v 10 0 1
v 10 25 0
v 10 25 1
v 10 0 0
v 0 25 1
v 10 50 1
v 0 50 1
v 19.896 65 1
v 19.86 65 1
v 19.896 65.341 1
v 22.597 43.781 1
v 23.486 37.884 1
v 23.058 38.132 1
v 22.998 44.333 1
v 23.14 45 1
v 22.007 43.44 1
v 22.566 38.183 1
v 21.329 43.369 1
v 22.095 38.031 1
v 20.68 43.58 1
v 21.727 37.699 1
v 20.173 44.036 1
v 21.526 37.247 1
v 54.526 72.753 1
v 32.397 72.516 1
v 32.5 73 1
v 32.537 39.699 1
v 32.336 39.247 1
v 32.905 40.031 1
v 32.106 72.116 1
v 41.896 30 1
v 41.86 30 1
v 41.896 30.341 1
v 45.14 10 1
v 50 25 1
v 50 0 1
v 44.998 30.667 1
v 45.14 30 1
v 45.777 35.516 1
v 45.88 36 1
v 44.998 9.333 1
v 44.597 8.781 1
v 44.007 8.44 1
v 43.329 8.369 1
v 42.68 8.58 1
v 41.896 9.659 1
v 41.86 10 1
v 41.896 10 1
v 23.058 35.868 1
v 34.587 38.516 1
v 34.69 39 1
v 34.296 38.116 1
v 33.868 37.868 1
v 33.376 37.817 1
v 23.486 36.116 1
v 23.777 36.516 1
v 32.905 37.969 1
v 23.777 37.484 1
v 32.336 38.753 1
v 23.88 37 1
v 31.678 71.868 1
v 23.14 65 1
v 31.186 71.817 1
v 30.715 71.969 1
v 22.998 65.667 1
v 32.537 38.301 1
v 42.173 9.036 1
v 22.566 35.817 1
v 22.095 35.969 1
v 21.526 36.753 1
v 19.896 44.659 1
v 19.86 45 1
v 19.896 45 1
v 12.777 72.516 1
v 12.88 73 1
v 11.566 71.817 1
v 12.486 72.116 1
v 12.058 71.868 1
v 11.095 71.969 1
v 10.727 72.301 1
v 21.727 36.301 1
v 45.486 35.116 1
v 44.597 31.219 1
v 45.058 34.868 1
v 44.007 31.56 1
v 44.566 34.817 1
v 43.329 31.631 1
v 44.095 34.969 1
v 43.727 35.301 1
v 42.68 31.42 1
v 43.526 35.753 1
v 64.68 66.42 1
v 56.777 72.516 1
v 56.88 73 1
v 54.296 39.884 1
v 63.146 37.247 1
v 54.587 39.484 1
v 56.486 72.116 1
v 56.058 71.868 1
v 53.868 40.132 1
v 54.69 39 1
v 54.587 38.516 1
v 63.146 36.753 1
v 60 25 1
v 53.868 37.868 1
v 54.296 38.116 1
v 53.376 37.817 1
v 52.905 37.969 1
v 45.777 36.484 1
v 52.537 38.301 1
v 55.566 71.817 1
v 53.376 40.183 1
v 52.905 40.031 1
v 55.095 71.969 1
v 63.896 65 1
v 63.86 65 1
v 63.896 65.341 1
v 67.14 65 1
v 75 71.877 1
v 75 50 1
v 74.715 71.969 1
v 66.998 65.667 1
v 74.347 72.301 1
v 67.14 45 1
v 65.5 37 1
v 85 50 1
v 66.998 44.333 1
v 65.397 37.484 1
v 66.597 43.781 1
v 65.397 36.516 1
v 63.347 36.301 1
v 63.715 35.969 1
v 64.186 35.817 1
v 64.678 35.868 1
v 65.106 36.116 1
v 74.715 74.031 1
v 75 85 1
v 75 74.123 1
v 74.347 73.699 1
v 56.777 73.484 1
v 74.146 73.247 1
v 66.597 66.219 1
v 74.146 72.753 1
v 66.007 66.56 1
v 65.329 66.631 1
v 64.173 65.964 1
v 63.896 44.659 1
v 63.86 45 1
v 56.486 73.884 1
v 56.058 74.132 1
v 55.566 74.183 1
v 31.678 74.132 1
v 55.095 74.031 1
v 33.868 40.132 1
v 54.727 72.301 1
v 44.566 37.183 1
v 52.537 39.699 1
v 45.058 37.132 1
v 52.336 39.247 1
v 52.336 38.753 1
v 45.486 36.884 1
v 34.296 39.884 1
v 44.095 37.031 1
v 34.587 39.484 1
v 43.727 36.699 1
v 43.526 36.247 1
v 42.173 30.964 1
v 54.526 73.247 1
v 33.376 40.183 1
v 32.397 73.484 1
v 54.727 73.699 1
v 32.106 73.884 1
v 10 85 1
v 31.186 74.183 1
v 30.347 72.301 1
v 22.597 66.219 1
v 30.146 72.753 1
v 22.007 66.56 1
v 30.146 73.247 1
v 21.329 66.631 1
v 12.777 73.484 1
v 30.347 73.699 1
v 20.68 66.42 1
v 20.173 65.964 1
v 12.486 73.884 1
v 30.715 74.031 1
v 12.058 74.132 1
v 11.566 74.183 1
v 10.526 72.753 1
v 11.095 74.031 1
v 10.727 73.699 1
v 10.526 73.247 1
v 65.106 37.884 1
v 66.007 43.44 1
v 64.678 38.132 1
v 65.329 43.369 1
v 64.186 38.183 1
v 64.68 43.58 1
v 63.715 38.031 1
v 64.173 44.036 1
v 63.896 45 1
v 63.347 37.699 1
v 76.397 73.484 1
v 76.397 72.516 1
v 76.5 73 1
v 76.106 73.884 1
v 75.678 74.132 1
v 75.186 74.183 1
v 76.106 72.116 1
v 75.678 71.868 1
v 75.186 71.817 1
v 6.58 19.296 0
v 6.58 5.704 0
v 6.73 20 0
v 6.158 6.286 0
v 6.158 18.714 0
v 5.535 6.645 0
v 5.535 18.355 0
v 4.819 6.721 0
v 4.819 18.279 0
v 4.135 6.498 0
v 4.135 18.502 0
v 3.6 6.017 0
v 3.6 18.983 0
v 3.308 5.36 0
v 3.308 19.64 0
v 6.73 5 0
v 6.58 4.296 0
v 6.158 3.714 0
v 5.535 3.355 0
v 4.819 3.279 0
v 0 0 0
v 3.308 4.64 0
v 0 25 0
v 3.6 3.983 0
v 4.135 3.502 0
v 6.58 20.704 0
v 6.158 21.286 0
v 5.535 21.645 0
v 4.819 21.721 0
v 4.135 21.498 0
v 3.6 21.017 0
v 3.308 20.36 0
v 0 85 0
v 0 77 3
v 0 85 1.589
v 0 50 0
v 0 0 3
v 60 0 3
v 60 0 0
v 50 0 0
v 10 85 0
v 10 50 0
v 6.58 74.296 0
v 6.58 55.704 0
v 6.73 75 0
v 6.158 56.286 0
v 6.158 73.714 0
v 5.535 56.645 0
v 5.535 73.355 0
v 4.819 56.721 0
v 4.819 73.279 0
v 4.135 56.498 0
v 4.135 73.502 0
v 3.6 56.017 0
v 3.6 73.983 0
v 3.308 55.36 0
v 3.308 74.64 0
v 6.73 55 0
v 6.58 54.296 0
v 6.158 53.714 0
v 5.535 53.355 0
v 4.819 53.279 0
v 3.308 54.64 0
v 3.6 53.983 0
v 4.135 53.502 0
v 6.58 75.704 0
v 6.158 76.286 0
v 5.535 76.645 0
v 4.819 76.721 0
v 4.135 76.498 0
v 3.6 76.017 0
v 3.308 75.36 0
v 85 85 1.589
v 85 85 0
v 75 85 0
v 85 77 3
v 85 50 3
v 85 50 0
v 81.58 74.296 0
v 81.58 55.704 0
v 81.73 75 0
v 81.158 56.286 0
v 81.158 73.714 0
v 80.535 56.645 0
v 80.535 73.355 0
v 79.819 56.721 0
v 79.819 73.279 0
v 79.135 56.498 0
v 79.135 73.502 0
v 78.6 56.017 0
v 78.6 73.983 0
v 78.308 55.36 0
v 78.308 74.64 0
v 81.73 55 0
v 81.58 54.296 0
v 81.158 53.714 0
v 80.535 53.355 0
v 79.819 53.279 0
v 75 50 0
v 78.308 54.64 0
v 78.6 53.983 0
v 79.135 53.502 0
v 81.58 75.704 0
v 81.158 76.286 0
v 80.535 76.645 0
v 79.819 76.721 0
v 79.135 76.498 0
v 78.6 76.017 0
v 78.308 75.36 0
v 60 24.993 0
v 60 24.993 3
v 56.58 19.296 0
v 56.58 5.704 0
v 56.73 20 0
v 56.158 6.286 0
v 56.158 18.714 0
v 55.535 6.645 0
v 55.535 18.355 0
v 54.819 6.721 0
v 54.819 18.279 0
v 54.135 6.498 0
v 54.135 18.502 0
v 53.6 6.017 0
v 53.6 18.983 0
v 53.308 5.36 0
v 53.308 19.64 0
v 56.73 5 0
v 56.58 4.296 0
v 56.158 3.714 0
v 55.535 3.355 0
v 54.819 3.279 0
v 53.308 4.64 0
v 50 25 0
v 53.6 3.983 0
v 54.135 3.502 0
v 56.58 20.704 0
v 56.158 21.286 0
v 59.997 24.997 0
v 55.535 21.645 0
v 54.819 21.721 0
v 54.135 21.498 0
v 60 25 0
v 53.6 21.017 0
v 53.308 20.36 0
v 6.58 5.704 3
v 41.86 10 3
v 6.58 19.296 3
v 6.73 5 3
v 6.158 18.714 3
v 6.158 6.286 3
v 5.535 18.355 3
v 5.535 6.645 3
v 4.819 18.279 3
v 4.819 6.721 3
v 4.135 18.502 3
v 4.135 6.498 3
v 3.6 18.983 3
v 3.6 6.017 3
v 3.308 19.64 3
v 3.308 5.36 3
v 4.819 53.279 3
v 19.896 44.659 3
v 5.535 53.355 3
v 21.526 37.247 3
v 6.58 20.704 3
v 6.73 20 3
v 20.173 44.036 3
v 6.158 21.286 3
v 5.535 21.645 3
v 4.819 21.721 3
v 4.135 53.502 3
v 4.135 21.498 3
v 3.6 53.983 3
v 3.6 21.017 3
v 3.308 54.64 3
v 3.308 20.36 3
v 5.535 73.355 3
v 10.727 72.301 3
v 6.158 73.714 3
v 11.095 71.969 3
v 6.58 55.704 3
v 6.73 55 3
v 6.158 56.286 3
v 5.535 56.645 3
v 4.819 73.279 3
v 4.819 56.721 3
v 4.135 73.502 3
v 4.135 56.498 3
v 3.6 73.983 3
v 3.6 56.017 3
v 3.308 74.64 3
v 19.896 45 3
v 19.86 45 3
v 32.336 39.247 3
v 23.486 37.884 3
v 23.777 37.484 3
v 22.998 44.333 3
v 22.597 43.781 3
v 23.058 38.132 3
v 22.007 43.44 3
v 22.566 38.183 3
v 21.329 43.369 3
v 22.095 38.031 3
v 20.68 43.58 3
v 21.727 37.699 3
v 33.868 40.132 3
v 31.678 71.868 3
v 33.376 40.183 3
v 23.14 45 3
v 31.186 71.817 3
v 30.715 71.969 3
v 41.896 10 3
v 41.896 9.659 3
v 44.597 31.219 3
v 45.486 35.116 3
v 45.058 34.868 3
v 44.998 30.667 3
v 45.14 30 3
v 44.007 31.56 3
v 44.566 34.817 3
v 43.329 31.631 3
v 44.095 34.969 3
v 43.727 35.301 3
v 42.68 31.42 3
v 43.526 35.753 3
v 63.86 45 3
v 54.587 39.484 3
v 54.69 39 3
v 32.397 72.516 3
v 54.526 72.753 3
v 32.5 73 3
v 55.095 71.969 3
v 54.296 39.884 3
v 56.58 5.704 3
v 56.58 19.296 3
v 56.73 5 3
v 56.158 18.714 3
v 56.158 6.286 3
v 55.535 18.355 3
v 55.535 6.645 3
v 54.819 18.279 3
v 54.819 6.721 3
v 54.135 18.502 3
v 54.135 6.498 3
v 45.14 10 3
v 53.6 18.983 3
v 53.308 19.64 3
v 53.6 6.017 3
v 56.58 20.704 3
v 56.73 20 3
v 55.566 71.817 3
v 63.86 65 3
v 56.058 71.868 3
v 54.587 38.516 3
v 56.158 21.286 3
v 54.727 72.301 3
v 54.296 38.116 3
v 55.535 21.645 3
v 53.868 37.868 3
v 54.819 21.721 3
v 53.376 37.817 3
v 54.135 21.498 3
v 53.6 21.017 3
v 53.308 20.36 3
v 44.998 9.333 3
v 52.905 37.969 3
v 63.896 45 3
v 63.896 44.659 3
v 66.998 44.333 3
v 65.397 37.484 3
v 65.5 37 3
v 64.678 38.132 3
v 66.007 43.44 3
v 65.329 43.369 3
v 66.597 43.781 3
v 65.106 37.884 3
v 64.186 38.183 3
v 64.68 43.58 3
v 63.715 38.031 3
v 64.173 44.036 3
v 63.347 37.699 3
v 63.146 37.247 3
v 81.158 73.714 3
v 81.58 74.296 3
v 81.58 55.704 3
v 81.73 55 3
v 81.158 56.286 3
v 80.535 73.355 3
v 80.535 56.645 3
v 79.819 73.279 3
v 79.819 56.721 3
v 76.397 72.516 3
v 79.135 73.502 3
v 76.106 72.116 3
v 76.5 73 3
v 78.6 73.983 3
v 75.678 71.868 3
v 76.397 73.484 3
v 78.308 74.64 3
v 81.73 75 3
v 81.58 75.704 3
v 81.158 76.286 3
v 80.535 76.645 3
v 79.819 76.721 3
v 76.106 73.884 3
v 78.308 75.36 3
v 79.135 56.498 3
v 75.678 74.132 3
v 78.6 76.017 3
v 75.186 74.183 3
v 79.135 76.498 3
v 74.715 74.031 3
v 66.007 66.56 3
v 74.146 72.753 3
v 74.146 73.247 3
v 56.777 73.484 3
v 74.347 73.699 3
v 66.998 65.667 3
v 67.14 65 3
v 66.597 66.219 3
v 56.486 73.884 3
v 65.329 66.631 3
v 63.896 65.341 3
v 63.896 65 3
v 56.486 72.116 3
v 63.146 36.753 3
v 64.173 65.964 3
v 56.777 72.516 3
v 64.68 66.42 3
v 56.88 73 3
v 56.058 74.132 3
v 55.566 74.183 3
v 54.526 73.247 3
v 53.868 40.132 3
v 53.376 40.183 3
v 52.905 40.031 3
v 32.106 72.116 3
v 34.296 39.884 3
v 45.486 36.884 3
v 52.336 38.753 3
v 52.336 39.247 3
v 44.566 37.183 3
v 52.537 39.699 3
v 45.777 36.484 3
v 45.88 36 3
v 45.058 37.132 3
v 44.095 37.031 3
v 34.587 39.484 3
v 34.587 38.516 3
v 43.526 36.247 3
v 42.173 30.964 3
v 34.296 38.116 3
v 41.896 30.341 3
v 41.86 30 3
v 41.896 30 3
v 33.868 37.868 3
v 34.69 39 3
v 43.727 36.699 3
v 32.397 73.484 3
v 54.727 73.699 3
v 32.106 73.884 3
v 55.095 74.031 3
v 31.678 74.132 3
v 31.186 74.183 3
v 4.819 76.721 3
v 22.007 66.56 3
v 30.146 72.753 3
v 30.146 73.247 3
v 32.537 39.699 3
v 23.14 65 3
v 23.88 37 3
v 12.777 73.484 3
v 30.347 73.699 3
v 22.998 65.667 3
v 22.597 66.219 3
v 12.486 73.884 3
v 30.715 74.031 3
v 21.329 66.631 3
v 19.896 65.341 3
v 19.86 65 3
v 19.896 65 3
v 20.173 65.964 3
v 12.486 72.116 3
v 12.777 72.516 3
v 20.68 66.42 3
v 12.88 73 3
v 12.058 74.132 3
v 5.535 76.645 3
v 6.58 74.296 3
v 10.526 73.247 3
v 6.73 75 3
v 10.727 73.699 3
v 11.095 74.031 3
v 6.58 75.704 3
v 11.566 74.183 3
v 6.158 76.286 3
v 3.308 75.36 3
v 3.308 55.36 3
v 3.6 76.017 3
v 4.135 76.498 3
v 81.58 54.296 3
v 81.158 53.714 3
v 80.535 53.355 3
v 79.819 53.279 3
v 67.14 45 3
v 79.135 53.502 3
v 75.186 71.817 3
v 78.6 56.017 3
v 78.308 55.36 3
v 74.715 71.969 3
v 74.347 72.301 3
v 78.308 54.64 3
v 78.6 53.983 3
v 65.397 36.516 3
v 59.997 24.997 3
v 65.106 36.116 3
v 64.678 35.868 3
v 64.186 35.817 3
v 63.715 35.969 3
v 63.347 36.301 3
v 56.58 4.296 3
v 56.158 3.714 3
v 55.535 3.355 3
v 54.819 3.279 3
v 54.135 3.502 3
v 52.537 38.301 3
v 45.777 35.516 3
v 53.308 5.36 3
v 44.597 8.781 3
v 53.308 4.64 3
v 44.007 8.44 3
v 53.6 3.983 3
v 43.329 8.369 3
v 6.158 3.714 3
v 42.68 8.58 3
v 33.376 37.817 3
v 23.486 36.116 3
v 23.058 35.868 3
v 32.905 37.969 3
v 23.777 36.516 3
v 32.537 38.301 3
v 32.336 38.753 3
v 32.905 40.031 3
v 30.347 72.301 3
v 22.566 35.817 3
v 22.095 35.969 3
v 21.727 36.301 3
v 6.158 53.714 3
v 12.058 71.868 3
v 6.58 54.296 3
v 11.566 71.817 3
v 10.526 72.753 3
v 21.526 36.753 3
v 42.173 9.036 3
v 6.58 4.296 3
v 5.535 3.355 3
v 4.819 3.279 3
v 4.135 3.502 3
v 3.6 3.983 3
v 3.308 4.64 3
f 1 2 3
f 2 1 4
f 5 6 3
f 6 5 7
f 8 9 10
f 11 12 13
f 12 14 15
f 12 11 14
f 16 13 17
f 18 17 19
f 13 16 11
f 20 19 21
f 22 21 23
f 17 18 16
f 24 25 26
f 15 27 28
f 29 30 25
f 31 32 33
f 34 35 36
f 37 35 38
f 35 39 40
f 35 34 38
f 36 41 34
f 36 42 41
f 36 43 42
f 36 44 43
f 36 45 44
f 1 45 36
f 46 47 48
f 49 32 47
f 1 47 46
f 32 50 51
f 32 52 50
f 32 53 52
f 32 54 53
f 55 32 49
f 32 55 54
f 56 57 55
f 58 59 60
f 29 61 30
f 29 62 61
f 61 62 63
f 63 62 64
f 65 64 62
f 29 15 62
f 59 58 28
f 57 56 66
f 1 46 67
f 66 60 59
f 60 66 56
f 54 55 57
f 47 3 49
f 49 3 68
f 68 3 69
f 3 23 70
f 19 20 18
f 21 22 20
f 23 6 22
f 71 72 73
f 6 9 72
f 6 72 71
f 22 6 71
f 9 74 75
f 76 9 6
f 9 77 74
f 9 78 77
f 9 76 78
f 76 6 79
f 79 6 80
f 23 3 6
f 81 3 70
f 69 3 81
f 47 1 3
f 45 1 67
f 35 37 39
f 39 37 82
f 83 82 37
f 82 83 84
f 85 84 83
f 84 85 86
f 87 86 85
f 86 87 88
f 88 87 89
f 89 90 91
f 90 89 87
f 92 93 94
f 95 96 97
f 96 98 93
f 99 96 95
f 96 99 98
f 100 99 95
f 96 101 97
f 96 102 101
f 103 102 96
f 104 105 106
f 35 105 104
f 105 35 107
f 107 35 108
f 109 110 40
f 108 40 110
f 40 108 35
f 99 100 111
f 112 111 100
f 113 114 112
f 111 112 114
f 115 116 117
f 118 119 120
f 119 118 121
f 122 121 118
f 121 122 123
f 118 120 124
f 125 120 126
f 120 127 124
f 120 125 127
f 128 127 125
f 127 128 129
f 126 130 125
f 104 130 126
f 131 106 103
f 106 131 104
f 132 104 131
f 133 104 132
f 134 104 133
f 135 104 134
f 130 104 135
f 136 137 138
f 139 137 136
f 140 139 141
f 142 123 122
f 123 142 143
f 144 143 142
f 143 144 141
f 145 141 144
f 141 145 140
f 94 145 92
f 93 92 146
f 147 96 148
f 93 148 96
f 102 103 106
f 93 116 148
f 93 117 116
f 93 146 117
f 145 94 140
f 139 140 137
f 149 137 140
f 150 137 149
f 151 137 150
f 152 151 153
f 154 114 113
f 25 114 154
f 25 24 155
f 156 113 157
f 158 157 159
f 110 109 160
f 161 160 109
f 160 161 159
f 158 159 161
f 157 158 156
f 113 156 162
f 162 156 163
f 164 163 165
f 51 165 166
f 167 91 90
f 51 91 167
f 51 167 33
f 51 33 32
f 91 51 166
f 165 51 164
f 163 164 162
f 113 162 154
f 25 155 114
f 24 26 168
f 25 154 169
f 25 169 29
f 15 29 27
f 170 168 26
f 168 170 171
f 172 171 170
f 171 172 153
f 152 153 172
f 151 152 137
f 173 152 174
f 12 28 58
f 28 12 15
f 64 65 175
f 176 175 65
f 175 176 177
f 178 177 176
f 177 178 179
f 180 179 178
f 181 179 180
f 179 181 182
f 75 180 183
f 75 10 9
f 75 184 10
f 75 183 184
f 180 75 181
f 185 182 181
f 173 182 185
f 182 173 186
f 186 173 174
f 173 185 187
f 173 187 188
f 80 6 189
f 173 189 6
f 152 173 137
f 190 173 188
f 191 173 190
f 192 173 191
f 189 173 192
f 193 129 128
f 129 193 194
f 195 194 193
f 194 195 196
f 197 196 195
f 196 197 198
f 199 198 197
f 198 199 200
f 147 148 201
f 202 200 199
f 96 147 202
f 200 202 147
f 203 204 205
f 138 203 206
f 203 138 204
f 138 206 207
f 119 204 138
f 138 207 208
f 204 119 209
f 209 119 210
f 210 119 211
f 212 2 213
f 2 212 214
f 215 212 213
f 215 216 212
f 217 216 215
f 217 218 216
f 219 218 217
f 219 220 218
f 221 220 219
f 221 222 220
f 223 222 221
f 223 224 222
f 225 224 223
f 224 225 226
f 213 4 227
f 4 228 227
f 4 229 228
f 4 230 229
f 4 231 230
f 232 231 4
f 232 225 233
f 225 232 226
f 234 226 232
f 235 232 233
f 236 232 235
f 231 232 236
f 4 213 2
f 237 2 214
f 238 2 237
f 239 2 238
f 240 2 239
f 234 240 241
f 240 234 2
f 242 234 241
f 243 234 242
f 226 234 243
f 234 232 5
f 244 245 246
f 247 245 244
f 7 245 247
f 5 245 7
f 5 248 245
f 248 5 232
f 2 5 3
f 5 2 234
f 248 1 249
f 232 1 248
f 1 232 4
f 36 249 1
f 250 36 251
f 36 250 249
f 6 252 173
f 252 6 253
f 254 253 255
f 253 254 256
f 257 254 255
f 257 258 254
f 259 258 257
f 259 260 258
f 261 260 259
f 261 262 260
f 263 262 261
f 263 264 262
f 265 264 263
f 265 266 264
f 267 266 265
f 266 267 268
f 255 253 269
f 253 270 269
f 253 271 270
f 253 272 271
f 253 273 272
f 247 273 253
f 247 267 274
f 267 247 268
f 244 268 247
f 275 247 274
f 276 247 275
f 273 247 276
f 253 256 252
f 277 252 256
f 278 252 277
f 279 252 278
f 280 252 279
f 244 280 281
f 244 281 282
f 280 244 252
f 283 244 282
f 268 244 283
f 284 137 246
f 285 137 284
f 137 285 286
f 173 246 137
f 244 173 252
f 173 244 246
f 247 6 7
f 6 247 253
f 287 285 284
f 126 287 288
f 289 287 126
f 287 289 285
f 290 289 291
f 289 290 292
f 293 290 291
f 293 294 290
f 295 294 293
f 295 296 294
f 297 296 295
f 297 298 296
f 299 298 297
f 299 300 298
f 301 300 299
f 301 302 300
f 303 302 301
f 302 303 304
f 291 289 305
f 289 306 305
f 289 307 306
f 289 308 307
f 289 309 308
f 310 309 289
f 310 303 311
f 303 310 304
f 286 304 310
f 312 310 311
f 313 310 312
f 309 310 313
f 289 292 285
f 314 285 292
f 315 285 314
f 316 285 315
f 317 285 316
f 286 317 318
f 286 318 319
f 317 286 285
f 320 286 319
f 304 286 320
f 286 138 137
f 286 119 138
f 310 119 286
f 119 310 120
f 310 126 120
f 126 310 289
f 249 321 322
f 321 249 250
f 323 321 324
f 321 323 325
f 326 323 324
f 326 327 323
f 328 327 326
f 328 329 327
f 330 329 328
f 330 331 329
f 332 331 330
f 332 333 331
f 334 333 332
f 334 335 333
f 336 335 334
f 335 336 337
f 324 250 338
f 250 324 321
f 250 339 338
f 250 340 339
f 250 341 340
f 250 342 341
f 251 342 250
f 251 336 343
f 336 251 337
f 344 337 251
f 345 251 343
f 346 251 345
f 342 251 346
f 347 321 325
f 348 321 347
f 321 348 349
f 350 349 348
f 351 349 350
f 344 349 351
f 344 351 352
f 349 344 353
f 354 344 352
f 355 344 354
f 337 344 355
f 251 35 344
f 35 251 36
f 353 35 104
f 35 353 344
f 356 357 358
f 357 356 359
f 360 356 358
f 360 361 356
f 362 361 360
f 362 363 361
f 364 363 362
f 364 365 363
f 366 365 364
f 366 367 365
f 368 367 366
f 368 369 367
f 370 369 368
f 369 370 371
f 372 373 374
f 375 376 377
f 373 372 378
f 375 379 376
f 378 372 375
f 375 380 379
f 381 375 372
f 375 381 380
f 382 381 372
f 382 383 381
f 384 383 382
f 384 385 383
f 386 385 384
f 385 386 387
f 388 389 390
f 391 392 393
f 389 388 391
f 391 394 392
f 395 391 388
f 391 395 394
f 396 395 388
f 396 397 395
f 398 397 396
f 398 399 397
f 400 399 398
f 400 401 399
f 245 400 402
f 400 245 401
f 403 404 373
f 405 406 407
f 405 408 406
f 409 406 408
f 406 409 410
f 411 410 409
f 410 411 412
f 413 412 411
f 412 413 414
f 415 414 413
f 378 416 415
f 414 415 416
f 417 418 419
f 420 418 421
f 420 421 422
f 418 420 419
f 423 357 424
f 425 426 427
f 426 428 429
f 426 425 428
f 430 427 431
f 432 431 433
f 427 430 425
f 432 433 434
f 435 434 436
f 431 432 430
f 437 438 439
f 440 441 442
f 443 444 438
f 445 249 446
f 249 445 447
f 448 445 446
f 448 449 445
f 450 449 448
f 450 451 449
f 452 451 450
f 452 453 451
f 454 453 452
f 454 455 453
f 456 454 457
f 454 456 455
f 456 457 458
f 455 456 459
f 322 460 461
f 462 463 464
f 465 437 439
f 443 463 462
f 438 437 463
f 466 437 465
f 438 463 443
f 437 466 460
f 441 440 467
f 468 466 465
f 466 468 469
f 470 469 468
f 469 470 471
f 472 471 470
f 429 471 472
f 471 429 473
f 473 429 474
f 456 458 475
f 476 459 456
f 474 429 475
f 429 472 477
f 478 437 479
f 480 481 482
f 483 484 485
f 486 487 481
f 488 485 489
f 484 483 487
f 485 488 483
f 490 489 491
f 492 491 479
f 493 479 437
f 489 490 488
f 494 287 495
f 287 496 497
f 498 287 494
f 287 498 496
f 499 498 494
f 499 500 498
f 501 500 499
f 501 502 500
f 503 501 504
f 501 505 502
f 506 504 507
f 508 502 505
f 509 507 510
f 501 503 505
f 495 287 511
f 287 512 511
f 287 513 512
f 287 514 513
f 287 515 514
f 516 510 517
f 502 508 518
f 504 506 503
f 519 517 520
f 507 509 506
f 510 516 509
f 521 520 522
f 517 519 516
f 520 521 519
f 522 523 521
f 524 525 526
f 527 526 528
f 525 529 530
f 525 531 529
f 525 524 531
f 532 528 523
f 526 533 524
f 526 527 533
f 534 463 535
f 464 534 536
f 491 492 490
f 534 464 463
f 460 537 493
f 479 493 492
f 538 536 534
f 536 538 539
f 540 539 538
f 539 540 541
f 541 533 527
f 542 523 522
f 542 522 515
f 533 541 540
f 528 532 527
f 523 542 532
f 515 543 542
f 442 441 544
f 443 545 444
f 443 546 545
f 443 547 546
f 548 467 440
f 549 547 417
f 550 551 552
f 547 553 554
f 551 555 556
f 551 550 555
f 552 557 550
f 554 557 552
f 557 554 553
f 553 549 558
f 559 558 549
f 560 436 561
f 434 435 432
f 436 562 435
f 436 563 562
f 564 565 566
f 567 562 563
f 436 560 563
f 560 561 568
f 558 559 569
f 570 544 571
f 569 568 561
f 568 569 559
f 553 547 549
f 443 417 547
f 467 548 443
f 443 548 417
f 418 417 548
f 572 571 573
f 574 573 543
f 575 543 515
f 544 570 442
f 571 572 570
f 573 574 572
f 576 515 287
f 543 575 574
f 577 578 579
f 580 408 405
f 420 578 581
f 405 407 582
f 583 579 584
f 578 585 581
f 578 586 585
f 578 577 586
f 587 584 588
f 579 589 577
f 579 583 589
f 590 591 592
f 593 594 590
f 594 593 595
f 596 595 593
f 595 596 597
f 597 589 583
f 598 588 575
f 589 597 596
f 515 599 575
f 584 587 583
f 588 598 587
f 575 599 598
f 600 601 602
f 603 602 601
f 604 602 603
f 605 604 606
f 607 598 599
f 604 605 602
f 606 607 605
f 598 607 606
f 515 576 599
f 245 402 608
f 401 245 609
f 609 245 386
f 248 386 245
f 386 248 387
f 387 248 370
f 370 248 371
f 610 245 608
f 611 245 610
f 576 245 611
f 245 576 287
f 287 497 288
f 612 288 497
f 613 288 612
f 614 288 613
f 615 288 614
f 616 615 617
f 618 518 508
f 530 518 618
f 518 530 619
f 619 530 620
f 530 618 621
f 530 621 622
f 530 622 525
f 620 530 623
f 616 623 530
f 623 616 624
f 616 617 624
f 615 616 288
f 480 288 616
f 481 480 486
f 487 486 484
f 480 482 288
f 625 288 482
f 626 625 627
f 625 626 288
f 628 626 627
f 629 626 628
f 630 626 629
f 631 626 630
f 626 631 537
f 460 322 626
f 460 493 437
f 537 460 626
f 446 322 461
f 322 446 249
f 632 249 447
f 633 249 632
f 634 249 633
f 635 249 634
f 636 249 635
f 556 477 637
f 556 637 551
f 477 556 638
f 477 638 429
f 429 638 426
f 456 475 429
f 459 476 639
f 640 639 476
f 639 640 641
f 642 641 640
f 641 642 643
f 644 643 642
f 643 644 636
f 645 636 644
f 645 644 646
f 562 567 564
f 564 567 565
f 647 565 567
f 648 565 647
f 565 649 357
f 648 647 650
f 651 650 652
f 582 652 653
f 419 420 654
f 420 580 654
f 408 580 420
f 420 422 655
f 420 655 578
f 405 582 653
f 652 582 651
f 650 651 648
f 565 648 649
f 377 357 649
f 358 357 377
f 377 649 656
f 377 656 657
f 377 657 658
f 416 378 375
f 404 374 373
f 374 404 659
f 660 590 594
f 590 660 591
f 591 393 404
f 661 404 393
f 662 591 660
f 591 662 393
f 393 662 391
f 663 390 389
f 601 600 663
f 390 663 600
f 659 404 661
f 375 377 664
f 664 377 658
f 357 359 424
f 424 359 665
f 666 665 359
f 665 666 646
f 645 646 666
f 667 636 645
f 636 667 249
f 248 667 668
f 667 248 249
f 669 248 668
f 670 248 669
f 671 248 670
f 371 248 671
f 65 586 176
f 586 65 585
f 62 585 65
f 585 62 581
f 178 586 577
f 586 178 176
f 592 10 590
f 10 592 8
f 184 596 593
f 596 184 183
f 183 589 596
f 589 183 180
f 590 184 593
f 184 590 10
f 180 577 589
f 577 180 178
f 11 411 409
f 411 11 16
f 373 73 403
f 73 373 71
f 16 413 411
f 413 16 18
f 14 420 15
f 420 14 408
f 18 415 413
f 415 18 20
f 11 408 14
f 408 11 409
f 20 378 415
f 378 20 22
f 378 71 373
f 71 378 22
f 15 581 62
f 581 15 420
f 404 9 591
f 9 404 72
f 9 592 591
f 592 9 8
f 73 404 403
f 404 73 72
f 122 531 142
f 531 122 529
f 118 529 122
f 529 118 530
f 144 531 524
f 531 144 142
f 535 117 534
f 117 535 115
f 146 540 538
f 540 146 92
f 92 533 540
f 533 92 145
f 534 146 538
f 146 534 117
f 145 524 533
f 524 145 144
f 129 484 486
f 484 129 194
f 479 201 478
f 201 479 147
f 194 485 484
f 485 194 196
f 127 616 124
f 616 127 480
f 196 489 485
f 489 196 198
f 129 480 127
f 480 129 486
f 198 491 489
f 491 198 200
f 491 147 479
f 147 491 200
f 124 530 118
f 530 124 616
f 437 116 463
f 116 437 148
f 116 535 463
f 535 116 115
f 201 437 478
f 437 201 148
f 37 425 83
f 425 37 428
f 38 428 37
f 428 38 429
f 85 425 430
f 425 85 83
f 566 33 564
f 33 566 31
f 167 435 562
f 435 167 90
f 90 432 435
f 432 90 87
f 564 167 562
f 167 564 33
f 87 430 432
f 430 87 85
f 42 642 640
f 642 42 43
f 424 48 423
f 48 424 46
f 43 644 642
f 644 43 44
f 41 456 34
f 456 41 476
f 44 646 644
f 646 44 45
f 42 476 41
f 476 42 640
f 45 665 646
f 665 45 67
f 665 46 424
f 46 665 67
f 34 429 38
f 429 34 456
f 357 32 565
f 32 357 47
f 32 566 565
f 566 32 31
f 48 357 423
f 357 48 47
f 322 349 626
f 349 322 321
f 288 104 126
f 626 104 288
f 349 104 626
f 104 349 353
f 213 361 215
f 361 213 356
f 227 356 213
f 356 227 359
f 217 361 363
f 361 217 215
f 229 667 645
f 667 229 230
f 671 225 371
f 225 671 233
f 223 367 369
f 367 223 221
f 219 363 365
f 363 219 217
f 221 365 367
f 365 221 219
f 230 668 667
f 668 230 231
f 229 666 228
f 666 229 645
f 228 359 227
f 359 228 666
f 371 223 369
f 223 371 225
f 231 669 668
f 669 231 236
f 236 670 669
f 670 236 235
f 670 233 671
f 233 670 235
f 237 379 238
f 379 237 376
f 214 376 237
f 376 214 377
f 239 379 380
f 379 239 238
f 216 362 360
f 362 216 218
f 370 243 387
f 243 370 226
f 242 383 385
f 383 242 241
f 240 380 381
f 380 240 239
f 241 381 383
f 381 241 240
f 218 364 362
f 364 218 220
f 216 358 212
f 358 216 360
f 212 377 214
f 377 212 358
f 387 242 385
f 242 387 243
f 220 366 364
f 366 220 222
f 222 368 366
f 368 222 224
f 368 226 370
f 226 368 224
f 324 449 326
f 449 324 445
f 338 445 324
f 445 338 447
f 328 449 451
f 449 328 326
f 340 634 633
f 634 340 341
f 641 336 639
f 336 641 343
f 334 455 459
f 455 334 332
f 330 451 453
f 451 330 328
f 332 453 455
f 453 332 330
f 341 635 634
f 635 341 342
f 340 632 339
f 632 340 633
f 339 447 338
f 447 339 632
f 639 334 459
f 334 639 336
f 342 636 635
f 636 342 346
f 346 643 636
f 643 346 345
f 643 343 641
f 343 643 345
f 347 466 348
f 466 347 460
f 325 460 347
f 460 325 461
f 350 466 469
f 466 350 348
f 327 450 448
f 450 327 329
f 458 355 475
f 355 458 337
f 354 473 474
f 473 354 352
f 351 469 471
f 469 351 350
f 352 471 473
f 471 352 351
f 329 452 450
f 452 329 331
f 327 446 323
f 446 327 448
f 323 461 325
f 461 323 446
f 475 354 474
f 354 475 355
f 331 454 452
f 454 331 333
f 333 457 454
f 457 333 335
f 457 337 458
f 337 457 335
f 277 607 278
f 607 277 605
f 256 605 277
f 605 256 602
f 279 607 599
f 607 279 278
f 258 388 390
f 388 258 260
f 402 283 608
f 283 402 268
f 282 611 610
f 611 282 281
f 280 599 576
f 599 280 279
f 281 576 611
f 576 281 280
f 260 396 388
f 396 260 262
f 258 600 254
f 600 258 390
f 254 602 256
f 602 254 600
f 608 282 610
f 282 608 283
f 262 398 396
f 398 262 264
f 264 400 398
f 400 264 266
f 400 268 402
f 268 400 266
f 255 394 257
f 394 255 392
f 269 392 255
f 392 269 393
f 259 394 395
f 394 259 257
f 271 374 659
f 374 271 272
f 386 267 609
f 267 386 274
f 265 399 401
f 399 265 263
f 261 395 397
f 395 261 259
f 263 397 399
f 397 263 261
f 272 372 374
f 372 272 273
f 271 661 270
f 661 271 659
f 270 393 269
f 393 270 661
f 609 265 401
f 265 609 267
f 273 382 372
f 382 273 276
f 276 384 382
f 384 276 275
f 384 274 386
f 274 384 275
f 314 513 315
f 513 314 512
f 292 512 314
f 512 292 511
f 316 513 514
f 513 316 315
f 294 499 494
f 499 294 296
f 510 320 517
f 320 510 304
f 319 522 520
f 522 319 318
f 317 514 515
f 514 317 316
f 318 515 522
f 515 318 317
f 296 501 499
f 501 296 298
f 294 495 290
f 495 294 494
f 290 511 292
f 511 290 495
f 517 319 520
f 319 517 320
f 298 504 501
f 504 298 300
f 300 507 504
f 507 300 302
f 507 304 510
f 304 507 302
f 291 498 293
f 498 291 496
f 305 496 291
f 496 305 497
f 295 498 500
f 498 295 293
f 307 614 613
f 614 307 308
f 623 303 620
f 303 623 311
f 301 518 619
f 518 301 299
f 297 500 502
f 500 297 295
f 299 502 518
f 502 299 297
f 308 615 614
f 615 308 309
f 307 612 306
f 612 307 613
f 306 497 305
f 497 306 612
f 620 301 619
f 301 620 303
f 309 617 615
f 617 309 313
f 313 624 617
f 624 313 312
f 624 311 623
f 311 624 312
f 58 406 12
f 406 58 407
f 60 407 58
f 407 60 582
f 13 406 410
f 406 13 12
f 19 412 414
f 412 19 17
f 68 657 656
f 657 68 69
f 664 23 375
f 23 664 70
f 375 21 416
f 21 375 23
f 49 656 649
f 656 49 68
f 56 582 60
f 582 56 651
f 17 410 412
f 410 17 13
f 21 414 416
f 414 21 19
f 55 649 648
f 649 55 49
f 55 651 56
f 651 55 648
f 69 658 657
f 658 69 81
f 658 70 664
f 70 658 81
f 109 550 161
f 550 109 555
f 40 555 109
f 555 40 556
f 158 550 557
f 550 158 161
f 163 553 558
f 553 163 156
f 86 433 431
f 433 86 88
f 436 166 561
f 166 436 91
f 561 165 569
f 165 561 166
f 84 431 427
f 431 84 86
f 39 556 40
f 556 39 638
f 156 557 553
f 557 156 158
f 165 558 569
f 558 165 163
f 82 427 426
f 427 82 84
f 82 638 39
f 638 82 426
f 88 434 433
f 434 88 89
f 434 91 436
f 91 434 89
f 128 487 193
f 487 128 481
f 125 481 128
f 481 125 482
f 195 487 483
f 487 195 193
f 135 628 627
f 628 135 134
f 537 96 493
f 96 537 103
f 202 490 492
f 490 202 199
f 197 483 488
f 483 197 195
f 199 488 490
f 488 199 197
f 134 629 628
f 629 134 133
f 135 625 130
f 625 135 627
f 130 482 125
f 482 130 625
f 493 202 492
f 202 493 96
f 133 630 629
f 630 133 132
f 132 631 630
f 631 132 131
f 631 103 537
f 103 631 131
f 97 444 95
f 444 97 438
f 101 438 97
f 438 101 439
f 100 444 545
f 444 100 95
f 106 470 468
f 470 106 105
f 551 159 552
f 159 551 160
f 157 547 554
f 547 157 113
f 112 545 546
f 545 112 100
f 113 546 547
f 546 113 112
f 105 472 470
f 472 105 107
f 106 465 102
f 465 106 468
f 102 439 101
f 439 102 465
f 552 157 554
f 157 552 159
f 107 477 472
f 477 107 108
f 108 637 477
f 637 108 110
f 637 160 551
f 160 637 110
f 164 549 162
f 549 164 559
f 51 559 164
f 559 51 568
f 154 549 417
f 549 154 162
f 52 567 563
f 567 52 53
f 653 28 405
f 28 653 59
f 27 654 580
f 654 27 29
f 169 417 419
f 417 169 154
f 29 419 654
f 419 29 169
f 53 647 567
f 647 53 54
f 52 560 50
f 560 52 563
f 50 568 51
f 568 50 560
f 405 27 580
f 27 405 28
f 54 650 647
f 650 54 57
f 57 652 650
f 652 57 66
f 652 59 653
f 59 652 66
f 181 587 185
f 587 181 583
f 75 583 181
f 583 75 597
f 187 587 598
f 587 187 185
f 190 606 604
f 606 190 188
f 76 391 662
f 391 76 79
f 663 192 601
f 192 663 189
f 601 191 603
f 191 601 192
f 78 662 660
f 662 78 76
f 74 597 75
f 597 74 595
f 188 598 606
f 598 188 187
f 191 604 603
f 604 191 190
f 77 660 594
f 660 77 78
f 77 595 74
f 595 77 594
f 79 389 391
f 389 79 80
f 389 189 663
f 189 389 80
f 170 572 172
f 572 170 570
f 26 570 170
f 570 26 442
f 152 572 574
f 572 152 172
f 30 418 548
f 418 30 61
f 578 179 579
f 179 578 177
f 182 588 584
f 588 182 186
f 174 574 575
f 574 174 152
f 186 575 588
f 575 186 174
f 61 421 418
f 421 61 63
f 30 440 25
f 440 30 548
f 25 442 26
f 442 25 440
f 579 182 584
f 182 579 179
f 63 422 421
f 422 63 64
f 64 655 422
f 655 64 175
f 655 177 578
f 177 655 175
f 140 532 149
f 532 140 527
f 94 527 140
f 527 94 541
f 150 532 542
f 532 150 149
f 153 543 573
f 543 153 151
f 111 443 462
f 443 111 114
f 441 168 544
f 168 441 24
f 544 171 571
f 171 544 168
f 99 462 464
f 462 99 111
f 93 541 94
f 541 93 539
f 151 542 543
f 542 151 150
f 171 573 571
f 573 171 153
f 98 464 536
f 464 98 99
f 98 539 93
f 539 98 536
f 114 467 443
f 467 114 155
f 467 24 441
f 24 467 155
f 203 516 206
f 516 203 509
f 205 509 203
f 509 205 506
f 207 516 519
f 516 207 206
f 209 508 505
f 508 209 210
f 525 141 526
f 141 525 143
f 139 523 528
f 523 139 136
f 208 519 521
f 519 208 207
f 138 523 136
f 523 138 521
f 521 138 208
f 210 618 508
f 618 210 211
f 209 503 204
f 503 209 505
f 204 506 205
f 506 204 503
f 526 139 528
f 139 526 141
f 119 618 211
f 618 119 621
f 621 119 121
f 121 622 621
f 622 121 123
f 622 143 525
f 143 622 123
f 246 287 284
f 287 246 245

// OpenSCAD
length=85;
wrist=60;
width=85;
res=15;
//length
difference(){
union(){
cube([10,25,1]); 
translate([0,length-35,0])cube([10,35,1]);
translate([wrist+25-10,length-35,0]) cube([10,35,1]);
translate([wrist-10,0,0]) cube([10,25,1]);   
translate([0,0,1])cube([wrist+25,length,2]);
}
union(){
//palm cutout
translate([85,50,0]) rotate([0,0,45+180]) cube([35.36,50,6]);
translate([wrist,0,0]) cube([length-wrist,25,6]);
//holes   
translate([5,5,0]) cylinder(10,r=3.46/2,true,$fn=res);
translate([5,20,0]) cylinder(10,r=3.46/2,true,$fn=res);   
translate([wrist-5,5,0]) cylinder(10,r=3.46/2,true,$fn=res);
translate([wrist-5,20,0]) cylinder(10,r=3.46/2,true,$fn=res);
    
translate([5,length-10,0]) cylinder(10,r=3.46/2,true,$fn=res);
translate([5,length-30,0]) cylinder(10,r=3.46/2,true,$fn=res);
translate([wrist+25-5,length-10,0]) cylinder(10,r=3.46/2,true,$fn=res);
translate([wrist+25-5,length-30,0]) cylinder(10,r=3.46/2,true,$fn=res);

translate([22.69,37,1]) cylinder(4,r=2.38/2,true,$fn=res);
translate([44.69,36,1]) cylinder(4,r=2.38/2,true,$fn=res);
translate([64.31,37,1]) cylinder(4,r=2.38/2,true,$fn=res); 
translate([53.5,39,1]) cylinder(4,r=2.38/2,true,$fn=res);
translate([33.5,39,1]) cylinder(4,r=2.38/2,true,$fn=res);
    
translate([11.69,73,1]) cylinder(4,r=2.38/2,true,$fn=res);
translate([31.31,73,1]) cylinder(4,r=2.38/2,true,$fn=res);
translate([55.69,73,1]) cylinder(4,r=2.38/2,true,$fn=res);  
translate([75.31,73,1]) cylinder(4,r=2.38/2,true,$fn=res);     
//slant    
translate([0,length-8,3]) rotate([360-10,0,0]) cube([width,50,5]);
//slots
union(){
    translate([21.5,65,1]) cylinder(2,r=1.64,true,$fn=res);
    translate([21.5,45,1]) cylinder(2,r=1.64,true,$fn=res); 
    translate([19.86,45,1]) cube([1.64*2,20,2]);
}
translate([44,0,0])
union(){
    translate([21.5,65,1]) cylinder(2,r=1.64,true,$fn=res);
    translate([21.5,45,1]) cylinder(2,r=1.64,true,$fn=res); 
    translate([19.86,45,1]) cube([1.64*2,20,2]);
}
translate([22,-35,0])
union(){
    translate([21.5,65,1]) cylinder(2,r=1.64,true,$fn=res);
    translate([21.5,45,1]) cylinder(2,r=1.64,true,$fn=res); 
    translate([19.86,45,1]) cube([1.64*2,20,2]);
}
}
}
